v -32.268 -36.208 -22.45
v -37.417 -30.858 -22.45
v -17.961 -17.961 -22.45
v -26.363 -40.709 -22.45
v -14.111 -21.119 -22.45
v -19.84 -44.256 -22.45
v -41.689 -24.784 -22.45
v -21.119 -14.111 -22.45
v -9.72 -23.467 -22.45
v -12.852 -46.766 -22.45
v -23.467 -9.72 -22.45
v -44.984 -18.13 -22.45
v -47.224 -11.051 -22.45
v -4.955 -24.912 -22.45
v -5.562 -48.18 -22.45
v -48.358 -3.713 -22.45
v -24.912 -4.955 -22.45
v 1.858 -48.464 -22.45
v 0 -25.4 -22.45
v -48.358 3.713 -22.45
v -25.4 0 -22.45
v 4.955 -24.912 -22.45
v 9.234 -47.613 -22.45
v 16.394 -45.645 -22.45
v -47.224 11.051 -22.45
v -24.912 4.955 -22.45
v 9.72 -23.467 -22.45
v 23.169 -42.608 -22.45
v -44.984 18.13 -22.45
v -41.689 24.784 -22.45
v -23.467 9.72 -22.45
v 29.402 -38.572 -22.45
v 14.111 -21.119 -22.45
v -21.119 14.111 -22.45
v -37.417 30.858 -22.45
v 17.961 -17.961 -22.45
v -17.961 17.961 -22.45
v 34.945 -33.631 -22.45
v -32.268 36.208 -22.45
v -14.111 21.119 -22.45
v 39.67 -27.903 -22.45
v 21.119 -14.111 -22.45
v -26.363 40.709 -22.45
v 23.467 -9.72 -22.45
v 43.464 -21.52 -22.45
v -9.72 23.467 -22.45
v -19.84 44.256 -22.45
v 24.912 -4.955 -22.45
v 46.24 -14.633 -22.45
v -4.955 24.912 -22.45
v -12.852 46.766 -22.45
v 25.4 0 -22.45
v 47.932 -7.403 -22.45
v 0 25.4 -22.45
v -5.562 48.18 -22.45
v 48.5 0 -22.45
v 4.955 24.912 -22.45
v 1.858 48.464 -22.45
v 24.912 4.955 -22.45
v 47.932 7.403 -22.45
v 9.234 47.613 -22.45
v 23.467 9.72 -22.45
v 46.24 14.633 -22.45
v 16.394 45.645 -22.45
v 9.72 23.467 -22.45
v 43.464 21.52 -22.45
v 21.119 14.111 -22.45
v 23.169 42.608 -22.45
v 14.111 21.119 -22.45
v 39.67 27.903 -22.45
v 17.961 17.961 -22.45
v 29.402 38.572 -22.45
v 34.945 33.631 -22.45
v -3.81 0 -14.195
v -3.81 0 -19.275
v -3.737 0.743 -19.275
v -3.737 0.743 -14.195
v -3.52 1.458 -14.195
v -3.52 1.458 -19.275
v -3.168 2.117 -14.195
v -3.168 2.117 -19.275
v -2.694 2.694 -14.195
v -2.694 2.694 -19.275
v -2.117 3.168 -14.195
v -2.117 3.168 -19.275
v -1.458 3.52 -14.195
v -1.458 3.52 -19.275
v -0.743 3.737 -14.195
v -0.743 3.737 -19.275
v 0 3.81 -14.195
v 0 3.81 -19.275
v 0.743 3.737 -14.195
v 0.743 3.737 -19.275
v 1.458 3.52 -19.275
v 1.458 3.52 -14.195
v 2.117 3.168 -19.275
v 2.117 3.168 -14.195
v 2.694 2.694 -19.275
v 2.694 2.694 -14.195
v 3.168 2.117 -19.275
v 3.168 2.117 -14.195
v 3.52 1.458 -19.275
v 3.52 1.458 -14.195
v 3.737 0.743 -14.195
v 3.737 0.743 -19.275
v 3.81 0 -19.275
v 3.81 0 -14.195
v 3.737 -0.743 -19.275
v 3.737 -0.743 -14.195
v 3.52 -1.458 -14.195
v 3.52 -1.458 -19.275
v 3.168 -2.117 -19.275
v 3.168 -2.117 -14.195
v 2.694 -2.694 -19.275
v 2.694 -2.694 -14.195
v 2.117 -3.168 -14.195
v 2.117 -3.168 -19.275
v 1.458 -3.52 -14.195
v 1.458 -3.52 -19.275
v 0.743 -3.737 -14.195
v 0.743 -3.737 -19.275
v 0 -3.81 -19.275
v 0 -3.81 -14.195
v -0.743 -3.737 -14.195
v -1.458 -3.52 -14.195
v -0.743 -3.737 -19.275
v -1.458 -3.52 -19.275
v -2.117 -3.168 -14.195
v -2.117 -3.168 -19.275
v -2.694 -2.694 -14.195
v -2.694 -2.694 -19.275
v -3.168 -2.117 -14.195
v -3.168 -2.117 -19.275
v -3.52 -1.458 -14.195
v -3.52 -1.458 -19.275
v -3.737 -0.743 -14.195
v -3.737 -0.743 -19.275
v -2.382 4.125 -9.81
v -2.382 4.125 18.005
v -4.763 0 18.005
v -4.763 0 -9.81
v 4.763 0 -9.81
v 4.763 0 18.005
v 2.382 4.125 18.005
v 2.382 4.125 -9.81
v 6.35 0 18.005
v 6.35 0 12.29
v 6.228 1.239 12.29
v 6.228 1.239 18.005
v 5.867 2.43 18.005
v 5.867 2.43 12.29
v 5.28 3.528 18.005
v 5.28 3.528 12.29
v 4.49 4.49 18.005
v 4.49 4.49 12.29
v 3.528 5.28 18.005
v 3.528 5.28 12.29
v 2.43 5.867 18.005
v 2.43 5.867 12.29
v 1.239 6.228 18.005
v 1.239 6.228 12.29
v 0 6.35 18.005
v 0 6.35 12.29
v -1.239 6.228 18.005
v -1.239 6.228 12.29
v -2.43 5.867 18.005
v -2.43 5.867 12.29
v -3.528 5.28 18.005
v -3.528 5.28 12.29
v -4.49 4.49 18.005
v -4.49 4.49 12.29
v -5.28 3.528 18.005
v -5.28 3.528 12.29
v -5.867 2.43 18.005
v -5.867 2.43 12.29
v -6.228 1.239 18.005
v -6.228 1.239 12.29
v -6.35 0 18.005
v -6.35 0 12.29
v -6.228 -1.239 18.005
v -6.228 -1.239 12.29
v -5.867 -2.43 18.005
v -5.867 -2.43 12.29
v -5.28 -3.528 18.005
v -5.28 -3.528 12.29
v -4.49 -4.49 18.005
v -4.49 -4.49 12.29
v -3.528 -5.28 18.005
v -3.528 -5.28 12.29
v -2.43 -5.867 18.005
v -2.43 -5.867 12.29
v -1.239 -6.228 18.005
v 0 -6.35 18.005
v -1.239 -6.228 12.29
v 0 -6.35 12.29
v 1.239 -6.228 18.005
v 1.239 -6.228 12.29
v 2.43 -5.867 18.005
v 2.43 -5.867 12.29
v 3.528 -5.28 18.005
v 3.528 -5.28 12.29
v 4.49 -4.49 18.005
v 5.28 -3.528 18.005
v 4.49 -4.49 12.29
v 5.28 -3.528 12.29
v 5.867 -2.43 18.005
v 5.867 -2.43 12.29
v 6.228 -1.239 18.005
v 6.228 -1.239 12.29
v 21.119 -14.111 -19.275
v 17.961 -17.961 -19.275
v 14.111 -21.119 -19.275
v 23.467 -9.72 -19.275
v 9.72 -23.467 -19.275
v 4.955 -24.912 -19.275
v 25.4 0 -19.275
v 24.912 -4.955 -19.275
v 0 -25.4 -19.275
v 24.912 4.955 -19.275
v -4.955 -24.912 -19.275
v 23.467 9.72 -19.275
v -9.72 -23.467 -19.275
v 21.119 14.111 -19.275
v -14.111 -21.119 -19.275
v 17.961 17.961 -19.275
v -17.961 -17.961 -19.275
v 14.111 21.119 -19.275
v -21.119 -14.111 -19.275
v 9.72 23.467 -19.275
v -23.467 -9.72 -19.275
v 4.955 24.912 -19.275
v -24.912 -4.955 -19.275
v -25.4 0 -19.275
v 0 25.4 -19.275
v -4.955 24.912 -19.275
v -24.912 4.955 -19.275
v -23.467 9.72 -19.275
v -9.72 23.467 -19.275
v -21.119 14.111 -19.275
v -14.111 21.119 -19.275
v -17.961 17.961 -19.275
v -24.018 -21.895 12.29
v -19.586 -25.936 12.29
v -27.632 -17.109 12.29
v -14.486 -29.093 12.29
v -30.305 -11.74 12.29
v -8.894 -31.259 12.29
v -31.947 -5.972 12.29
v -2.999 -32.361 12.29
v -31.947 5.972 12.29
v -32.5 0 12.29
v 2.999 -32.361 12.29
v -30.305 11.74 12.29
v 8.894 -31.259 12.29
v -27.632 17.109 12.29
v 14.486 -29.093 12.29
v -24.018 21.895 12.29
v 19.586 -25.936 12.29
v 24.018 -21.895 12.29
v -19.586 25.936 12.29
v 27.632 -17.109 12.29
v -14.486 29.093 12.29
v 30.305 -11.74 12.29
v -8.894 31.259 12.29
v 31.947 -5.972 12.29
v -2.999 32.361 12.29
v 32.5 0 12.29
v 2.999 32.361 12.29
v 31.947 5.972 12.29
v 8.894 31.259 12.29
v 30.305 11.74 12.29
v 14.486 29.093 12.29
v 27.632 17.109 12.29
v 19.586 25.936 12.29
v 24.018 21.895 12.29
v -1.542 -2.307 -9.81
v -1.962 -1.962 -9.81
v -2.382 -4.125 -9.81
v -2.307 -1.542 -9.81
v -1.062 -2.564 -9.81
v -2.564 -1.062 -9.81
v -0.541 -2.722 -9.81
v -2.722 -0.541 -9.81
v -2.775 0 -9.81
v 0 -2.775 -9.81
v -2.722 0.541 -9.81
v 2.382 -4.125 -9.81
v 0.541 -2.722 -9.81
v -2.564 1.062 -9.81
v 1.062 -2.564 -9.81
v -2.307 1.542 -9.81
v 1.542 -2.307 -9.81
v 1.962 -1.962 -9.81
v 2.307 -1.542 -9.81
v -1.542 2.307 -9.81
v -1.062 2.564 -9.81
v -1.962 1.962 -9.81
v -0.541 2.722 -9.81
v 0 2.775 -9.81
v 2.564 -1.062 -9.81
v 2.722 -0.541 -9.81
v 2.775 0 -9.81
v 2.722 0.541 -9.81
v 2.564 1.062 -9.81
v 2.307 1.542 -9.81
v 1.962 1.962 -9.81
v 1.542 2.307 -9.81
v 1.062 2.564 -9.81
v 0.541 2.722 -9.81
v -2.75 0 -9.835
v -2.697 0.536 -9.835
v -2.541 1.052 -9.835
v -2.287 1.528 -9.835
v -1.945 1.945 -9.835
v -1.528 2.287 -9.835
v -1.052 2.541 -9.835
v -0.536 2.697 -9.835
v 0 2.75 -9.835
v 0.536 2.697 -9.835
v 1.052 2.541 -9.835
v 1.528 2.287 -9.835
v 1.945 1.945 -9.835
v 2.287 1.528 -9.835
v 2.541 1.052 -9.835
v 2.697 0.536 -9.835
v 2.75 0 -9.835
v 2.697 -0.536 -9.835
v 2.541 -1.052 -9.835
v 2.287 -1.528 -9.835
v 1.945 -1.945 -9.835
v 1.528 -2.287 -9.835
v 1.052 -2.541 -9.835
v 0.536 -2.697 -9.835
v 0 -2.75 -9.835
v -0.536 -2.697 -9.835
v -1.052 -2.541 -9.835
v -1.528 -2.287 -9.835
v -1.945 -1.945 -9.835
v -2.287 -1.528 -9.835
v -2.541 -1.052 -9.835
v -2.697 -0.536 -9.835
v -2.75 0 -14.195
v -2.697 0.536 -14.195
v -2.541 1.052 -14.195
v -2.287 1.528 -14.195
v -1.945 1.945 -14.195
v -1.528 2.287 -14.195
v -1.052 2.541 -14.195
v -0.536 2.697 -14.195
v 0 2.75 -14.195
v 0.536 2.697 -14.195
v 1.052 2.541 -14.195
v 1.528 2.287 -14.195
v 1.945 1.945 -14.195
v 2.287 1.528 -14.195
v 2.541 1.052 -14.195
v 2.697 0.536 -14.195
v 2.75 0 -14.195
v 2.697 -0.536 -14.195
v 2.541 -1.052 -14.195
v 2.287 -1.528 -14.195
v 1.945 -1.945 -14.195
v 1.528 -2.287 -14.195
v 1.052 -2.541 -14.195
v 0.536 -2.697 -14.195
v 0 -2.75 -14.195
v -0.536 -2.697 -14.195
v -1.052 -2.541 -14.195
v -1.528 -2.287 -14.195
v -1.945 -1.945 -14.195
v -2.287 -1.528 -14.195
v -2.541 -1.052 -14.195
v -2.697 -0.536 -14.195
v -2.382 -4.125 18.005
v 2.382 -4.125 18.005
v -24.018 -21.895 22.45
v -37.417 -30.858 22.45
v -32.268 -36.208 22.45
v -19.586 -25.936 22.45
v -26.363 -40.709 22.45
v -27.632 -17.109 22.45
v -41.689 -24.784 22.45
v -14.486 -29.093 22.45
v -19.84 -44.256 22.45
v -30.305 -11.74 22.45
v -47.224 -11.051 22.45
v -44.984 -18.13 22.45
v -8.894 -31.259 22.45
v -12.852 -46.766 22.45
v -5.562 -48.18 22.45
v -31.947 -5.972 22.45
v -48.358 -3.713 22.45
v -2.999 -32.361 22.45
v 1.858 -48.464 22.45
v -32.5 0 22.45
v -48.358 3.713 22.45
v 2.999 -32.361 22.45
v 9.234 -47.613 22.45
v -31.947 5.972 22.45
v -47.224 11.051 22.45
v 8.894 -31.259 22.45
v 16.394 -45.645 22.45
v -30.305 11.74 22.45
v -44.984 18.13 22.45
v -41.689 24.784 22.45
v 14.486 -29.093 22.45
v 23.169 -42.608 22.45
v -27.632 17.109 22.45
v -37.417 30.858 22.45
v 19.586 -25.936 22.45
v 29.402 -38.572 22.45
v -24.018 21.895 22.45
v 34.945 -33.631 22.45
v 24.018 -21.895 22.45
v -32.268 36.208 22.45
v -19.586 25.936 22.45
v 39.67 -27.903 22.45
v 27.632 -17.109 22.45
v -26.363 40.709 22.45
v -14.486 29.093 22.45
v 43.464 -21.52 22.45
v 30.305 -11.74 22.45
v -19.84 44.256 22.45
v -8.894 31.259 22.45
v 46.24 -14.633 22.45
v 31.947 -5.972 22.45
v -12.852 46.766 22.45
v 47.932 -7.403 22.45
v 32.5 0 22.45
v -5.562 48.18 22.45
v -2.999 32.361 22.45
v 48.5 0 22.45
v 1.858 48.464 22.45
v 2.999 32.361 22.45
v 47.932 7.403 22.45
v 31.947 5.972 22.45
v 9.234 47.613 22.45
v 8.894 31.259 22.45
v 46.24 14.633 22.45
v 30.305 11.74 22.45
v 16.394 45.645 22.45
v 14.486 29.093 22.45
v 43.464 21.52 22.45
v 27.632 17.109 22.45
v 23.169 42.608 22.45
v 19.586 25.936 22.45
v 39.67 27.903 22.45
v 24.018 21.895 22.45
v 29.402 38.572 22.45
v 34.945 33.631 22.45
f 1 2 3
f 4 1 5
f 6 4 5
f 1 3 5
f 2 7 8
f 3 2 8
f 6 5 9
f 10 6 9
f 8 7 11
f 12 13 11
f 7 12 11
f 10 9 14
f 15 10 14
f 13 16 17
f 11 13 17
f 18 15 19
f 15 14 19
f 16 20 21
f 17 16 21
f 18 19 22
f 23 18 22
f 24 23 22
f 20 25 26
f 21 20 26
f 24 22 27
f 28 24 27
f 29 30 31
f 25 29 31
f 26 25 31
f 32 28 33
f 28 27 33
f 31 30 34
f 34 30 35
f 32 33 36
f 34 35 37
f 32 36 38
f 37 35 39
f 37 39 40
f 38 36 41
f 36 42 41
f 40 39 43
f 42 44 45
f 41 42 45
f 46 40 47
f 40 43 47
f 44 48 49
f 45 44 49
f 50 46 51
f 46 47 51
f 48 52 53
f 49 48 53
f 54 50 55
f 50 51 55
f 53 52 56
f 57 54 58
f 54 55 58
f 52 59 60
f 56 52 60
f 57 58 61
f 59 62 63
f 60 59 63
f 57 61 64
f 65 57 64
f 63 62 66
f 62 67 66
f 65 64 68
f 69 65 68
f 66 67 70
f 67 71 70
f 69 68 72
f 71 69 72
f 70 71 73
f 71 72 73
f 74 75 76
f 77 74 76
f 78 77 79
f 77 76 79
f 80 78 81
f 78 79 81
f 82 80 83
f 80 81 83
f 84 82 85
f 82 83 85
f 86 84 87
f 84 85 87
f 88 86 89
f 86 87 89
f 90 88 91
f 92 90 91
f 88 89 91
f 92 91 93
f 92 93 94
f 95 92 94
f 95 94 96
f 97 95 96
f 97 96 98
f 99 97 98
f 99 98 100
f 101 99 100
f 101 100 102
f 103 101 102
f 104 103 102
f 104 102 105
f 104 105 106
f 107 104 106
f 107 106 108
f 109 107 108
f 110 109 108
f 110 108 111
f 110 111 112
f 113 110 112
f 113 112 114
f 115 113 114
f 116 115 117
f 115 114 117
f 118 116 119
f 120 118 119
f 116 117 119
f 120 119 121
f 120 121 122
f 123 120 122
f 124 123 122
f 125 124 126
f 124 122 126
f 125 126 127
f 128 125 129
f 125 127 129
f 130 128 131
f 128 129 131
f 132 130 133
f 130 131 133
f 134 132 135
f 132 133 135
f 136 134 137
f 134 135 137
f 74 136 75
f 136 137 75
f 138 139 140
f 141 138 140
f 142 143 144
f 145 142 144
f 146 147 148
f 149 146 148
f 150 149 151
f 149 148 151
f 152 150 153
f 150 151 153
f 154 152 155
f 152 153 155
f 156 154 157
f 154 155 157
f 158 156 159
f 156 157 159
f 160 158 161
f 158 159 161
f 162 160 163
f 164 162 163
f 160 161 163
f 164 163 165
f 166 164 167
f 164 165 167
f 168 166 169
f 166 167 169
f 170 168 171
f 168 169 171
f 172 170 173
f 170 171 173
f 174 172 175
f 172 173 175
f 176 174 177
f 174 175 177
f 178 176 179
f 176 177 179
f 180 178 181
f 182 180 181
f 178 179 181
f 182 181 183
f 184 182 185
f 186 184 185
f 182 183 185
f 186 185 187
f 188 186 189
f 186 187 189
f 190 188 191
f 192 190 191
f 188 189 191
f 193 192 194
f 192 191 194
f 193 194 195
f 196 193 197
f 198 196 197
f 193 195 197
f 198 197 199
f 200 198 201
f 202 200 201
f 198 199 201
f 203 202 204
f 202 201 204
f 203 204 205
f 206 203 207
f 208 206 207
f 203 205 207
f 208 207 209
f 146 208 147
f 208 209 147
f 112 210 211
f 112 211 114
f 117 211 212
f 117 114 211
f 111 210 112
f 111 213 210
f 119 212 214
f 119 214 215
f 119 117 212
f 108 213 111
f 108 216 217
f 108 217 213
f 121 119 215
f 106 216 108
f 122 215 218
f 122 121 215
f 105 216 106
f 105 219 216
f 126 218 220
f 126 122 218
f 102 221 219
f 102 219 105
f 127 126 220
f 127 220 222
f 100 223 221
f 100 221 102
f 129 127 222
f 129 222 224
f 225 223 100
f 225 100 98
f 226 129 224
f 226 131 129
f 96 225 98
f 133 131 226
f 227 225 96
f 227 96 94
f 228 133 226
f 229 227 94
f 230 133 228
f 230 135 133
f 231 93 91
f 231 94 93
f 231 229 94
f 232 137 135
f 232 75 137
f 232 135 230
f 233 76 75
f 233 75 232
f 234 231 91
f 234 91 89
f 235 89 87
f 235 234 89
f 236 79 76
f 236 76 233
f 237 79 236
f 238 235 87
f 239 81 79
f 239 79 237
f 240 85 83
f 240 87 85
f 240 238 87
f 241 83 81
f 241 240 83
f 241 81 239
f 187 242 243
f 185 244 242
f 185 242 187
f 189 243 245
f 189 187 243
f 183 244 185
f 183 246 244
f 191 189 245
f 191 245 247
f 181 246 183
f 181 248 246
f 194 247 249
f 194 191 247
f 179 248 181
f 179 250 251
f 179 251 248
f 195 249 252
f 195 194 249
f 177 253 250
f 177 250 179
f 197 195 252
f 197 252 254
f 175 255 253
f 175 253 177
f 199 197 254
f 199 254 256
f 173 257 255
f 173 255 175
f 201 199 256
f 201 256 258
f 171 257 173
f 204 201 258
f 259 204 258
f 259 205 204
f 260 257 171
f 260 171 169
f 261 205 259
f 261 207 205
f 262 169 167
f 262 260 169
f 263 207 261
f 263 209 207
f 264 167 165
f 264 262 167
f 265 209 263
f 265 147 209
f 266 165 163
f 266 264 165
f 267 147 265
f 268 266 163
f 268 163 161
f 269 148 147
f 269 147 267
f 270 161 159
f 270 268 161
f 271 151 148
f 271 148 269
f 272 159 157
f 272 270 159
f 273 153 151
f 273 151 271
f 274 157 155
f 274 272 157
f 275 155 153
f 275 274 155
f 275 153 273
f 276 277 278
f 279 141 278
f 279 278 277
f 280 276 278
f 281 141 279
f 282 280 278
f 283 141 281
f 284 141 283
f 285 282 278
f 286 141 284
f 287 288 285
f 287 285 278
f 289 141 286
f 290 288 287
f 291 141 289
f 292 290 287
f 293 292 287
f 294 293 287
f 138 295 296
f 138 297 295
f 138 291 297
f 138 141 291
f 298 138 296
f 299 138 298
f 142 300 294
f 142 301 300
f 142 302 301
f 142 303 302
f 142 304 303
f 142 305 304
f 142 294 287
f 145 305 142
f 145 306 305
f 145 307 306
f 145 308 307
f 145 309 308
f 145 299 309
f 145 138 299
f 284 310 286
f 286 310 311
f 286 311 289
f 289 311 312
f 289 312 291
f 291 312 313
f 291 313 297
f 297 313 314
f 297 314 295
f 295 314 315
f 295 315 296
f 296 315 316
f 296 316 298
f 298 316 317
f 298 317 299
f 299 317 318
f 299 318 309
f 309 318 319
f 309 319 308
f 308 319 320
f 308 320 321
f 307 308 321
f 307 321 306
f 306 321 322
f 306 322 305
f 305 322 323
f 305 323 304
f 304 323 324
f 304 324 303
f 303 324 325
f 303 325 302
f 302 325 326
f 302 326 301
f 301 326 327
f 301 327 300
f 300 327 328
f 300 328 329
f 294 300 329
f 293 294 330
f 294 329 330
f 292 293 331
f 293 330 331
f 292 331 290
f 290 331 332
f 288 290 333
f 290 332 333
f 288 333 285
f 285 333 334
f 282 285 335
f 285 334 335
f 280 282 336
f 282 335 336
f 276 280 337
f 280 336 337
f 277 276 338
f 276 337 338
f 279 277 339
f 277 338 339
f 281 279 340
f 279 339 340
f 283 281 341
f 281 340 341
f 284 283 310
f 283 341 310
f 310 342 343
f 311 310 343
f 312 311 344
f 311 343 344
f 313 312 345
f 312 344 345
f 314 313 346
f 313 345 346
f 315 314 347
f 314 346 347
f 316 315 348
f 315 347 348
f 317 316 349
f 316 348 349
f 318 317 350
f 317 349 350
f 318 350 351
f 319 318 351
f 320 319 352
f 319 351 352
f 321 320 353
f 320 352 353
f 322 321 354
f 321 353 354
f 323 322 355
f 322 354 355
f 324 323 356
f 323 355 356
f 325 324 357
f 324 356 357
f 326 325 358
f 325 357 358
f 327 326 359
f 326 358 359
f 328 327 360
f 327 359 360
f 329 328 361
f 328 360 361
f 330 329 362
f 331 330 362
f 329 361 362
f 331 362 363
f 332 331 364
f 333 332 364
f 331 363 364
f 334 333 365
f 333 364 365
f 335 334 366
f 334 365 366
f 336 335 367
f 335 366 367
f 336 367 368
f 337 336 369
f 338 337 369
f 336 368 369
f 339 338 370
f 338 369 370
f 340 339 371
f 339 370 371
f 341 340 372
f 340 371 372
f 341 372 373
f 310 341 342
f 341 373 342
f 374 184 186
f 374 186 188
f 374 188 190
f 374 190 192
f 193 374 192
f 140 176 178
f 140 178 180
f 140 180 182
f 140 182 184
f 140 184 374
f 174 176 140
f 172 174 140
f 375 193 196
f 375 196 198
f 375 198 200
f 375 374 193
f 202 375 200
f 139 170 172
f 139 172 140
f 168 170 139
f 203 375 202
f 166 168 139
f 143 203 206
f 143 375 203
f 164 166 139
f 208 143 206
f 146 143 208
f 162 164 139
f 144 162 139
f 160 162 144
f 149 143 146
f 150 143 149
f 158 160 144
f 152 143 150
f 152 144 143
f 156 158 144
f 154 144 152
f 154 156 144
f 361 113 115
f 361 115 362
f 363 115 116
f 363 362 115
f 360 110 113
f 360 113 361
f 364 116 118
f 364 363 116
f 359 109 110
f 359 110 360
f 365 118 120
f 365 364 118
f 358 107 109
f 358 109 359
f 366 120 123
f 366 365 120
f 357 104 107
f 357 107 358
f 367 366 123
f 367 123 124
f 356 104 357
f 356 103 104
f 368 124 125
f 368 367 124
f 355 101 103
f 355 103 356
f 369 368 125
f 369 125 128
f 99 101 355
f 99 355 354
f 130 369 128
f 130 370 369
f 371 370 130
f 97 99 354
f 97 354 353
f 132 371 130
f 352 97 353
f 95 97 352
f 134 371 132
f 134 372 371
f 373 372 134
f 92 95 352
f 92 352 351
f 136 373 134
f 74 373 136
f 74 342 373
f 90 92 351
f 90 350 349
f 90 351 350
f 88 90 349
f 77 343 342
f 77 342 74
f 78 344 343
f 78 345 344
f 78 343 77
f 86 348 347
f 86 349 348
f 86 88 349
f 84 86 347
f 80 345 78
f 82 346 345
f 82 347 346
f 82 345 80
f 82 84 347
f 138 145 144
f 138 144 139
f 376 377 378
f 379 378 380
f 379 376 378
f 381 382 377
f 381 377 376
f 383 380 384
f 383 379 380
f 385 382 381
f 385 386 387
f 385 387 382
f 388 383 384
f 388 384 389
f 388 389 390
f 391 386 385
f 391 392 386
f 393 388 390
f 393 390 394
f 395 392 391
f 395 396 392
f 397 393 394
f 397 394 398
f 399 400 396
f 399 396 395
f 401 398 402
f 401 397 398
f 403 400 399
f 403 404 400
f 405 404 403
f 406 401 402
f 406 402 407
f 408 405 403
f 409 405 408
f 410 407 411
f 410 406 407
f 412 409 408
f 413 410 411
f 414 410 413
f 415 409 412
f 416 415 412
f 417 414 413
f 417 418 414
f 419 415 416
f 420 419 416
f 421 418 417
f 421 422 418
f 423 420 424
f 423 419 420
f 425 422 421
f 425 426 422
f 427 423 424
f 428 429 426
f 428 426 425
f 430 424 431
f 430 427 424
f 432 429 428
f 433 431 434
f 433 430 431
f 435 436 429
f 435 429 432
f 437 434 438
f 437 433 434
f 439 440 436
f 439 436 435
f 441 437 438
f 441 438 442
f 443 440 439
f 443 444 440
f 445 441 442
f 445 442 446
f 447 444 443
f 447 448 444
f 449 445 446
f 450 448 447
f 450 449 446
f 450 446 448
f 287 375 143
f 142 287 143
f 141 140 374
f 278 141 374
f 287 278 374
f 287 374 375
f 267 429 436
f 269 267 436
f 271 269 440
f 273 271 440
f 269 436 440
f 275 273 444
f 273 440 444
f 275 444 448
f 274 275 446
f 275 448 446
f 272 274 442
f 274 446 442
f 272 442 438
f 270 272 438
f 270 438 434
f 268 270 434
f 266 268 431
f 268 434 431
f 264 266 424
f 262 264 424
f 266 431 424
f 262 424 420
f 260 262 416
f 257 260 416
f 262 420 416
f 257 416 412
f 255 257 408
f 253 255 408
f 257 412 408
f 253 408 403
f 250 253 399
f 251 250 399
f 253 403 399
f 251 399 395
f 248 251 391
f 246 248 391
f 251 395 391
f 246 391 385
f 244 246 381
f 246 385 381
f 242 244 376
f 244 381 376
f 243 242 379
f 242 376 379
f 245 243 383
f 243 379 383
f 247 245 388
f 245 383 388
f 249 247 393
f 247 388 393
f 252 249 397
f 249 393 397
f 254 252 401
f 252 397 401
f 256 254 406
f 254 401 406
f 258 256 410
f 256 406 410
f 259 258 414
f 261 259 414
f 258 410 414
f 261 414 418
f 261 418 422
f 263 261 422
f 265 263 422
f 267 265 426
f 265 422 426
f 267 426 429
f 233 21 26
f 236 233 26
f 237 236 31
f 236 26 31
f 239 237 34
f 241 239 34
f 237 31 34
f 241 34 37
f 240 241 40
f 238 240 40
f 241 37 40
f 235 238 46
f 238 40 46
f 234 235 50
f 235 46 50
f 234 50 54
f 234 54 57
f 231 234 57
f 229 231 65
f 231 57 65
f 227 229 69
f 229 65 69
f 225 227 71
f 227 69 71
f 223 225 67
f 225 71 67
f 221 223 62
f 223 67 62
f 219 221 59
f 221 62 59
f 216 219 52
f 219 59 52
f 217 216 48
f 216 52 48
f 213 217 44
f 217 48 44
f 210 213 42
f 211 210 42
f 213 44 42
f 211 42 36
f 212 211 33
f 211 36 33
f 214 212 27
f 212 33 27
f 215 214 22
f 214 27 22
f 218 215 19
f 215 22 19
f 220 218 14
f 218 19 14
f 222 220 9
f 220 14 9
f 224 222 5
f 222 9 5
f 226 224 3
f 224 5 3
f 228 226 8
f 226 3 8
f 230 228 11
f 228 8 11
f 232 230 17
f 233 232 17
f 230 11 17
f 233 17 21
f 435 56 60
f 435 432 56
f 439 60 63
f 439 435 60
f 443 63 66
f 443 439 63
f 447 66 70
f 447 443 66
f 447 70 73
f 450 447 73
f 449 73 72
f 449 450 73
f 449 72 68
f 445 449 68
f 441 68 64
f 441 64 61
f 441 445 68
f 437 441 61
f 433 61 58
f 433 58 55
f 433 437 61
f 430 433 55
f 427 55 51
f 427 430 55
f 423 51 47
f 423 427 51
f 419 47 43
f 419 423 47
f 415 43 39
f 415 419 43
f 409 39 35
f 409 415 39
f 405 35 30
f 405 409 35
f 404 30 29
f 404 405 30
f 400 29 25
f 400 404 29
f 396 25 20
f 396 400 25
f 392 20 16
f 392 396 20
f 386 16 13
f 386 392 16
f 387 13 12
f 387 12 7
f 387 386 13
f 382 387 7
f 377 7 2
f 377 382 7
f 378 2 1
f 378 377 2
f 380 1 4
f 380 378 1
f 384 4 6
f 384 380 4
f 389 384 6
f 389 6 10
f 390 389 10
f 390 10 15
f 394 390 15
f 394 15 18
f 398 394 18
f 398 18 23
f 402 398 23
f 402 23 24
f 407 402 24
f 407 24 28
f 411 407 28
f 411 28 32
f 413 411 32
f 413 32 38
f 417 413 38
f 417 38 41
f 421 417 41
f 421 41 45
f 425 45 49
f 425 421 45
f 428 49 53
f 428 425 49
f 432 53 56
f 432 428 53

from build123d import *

# Parameters (mm, degrees)
SKETCH2_R                      = 48.5
BOSS_EXTRUDE1_DEPTH            = 22.45
SKETCH3_R                      = 32.5
CUT_EXTRUDE1_DEPTH             = 10.16
SKETCH9_R                      = 6.35
BOSS_EXTRUDE2_DEPTH            = 5.715
CUT_EXTRUDE2_DEPTH             = 77.885418644
CUT_EXTRUDE2_DEPTH_BACK        = 22.1
M5_CLEARANCE_HOLE1_D           = 5.5
M5_CLEARANCE_HOLE1_CSINK_D     = 5.55
M5_CLEARANCE_HOLE1_CSINK_ANGLE = 90
SKETCH8_R                      = 3.81
CUT_EXTRUDE3_DEPTH             = 8.255
SKETCH10_R                     = 25.4
CUT_EXTRUDE4_DEPTH             = 3.175


with BuildPart() as part:
    # Sketch2 → Boss-Extrude1 (new, symmetric)
    with BuildSketch(Plane.XY):
        Circle(SKETCH2_R)
    extrude(amount=BOSS_EXTRUDE1_DEPTH, both=True)

    # Sketch3 → Cut-Extrude1 (cut)
    with BuildSketch(Plane.XY.offset(22.45)):
        Circle(SKETCH3_R)
    extrude(amount=-CUT_EXTRUDE1_DEPTH, mode=Mode.SUBTRACT)

    # Sketch9 → Boss-Extrude2 (add)
    with BuildSketch(Plane.XY.offset(12.29)):
        Circle(SKETCH9_R)
    extrude(amount=BOSS_EXTRUDE2_DEPTH)

    # Sketch4 → Cut-Extrude2 (cut, two sides: drawn at the far end of the back side and taken through both)
    with BuildSketch(Plane.XY.offset(12.29).offset(-CUT_EXTRUDE2_DEPTH_BACK)):
        Polygon((2.38156986, 4.125), (-2.38156986, 4.125), (-4.763139721, 0), (-2.38156986, -4.125), (2.38156986, -4.125), (4.763139721, 0), align=None)
    extrude(amount=CUT_EXTRUDE2_DEPTH + CUT_EXTRUDE2_DEPTH_BACK, mode=Mode.SUBTRACT)

    # M5 Clearance Hole1 (through all)
    with Locations(Plane.XY.offset(-9.81)):
        with Locations((0, 0)):
            CounterSinkHole(M5_CLEARANCE_HOLE1_D / 2, M5_CLEARANCE_HOLE1_CSINK_D / 2, counter_sink_angle=M5_CLEARANCE_HOLE1_CSINK_ANGLE)

    # Sketch8 → Cut-Extrude3 (cut)
    with BuildSketch(Plane(origin=(0, 0, -22.45), x_dir=(-1, 0, 0), z_dir=(0, 0, -1))):
        Circle(SKETCH8_R)
    extrude(amount=-CUT_EXTRUDE3_DEPTH, mode=Mode.SUBTRACT)

    # Sketch10 → Cut-Extrude4 (cut)
    with BuildSketch(Plane(origin=(0, 0, -22.45), x_dir=(-1, 0, 0), z_dir=(0, 0, -1))):
        Circle(SKETCH10_R)
    extrude(amount=-CUT_EXTRUDE4_DEPTH, mode=Mode.SUBTRACT)


solid = part.part
